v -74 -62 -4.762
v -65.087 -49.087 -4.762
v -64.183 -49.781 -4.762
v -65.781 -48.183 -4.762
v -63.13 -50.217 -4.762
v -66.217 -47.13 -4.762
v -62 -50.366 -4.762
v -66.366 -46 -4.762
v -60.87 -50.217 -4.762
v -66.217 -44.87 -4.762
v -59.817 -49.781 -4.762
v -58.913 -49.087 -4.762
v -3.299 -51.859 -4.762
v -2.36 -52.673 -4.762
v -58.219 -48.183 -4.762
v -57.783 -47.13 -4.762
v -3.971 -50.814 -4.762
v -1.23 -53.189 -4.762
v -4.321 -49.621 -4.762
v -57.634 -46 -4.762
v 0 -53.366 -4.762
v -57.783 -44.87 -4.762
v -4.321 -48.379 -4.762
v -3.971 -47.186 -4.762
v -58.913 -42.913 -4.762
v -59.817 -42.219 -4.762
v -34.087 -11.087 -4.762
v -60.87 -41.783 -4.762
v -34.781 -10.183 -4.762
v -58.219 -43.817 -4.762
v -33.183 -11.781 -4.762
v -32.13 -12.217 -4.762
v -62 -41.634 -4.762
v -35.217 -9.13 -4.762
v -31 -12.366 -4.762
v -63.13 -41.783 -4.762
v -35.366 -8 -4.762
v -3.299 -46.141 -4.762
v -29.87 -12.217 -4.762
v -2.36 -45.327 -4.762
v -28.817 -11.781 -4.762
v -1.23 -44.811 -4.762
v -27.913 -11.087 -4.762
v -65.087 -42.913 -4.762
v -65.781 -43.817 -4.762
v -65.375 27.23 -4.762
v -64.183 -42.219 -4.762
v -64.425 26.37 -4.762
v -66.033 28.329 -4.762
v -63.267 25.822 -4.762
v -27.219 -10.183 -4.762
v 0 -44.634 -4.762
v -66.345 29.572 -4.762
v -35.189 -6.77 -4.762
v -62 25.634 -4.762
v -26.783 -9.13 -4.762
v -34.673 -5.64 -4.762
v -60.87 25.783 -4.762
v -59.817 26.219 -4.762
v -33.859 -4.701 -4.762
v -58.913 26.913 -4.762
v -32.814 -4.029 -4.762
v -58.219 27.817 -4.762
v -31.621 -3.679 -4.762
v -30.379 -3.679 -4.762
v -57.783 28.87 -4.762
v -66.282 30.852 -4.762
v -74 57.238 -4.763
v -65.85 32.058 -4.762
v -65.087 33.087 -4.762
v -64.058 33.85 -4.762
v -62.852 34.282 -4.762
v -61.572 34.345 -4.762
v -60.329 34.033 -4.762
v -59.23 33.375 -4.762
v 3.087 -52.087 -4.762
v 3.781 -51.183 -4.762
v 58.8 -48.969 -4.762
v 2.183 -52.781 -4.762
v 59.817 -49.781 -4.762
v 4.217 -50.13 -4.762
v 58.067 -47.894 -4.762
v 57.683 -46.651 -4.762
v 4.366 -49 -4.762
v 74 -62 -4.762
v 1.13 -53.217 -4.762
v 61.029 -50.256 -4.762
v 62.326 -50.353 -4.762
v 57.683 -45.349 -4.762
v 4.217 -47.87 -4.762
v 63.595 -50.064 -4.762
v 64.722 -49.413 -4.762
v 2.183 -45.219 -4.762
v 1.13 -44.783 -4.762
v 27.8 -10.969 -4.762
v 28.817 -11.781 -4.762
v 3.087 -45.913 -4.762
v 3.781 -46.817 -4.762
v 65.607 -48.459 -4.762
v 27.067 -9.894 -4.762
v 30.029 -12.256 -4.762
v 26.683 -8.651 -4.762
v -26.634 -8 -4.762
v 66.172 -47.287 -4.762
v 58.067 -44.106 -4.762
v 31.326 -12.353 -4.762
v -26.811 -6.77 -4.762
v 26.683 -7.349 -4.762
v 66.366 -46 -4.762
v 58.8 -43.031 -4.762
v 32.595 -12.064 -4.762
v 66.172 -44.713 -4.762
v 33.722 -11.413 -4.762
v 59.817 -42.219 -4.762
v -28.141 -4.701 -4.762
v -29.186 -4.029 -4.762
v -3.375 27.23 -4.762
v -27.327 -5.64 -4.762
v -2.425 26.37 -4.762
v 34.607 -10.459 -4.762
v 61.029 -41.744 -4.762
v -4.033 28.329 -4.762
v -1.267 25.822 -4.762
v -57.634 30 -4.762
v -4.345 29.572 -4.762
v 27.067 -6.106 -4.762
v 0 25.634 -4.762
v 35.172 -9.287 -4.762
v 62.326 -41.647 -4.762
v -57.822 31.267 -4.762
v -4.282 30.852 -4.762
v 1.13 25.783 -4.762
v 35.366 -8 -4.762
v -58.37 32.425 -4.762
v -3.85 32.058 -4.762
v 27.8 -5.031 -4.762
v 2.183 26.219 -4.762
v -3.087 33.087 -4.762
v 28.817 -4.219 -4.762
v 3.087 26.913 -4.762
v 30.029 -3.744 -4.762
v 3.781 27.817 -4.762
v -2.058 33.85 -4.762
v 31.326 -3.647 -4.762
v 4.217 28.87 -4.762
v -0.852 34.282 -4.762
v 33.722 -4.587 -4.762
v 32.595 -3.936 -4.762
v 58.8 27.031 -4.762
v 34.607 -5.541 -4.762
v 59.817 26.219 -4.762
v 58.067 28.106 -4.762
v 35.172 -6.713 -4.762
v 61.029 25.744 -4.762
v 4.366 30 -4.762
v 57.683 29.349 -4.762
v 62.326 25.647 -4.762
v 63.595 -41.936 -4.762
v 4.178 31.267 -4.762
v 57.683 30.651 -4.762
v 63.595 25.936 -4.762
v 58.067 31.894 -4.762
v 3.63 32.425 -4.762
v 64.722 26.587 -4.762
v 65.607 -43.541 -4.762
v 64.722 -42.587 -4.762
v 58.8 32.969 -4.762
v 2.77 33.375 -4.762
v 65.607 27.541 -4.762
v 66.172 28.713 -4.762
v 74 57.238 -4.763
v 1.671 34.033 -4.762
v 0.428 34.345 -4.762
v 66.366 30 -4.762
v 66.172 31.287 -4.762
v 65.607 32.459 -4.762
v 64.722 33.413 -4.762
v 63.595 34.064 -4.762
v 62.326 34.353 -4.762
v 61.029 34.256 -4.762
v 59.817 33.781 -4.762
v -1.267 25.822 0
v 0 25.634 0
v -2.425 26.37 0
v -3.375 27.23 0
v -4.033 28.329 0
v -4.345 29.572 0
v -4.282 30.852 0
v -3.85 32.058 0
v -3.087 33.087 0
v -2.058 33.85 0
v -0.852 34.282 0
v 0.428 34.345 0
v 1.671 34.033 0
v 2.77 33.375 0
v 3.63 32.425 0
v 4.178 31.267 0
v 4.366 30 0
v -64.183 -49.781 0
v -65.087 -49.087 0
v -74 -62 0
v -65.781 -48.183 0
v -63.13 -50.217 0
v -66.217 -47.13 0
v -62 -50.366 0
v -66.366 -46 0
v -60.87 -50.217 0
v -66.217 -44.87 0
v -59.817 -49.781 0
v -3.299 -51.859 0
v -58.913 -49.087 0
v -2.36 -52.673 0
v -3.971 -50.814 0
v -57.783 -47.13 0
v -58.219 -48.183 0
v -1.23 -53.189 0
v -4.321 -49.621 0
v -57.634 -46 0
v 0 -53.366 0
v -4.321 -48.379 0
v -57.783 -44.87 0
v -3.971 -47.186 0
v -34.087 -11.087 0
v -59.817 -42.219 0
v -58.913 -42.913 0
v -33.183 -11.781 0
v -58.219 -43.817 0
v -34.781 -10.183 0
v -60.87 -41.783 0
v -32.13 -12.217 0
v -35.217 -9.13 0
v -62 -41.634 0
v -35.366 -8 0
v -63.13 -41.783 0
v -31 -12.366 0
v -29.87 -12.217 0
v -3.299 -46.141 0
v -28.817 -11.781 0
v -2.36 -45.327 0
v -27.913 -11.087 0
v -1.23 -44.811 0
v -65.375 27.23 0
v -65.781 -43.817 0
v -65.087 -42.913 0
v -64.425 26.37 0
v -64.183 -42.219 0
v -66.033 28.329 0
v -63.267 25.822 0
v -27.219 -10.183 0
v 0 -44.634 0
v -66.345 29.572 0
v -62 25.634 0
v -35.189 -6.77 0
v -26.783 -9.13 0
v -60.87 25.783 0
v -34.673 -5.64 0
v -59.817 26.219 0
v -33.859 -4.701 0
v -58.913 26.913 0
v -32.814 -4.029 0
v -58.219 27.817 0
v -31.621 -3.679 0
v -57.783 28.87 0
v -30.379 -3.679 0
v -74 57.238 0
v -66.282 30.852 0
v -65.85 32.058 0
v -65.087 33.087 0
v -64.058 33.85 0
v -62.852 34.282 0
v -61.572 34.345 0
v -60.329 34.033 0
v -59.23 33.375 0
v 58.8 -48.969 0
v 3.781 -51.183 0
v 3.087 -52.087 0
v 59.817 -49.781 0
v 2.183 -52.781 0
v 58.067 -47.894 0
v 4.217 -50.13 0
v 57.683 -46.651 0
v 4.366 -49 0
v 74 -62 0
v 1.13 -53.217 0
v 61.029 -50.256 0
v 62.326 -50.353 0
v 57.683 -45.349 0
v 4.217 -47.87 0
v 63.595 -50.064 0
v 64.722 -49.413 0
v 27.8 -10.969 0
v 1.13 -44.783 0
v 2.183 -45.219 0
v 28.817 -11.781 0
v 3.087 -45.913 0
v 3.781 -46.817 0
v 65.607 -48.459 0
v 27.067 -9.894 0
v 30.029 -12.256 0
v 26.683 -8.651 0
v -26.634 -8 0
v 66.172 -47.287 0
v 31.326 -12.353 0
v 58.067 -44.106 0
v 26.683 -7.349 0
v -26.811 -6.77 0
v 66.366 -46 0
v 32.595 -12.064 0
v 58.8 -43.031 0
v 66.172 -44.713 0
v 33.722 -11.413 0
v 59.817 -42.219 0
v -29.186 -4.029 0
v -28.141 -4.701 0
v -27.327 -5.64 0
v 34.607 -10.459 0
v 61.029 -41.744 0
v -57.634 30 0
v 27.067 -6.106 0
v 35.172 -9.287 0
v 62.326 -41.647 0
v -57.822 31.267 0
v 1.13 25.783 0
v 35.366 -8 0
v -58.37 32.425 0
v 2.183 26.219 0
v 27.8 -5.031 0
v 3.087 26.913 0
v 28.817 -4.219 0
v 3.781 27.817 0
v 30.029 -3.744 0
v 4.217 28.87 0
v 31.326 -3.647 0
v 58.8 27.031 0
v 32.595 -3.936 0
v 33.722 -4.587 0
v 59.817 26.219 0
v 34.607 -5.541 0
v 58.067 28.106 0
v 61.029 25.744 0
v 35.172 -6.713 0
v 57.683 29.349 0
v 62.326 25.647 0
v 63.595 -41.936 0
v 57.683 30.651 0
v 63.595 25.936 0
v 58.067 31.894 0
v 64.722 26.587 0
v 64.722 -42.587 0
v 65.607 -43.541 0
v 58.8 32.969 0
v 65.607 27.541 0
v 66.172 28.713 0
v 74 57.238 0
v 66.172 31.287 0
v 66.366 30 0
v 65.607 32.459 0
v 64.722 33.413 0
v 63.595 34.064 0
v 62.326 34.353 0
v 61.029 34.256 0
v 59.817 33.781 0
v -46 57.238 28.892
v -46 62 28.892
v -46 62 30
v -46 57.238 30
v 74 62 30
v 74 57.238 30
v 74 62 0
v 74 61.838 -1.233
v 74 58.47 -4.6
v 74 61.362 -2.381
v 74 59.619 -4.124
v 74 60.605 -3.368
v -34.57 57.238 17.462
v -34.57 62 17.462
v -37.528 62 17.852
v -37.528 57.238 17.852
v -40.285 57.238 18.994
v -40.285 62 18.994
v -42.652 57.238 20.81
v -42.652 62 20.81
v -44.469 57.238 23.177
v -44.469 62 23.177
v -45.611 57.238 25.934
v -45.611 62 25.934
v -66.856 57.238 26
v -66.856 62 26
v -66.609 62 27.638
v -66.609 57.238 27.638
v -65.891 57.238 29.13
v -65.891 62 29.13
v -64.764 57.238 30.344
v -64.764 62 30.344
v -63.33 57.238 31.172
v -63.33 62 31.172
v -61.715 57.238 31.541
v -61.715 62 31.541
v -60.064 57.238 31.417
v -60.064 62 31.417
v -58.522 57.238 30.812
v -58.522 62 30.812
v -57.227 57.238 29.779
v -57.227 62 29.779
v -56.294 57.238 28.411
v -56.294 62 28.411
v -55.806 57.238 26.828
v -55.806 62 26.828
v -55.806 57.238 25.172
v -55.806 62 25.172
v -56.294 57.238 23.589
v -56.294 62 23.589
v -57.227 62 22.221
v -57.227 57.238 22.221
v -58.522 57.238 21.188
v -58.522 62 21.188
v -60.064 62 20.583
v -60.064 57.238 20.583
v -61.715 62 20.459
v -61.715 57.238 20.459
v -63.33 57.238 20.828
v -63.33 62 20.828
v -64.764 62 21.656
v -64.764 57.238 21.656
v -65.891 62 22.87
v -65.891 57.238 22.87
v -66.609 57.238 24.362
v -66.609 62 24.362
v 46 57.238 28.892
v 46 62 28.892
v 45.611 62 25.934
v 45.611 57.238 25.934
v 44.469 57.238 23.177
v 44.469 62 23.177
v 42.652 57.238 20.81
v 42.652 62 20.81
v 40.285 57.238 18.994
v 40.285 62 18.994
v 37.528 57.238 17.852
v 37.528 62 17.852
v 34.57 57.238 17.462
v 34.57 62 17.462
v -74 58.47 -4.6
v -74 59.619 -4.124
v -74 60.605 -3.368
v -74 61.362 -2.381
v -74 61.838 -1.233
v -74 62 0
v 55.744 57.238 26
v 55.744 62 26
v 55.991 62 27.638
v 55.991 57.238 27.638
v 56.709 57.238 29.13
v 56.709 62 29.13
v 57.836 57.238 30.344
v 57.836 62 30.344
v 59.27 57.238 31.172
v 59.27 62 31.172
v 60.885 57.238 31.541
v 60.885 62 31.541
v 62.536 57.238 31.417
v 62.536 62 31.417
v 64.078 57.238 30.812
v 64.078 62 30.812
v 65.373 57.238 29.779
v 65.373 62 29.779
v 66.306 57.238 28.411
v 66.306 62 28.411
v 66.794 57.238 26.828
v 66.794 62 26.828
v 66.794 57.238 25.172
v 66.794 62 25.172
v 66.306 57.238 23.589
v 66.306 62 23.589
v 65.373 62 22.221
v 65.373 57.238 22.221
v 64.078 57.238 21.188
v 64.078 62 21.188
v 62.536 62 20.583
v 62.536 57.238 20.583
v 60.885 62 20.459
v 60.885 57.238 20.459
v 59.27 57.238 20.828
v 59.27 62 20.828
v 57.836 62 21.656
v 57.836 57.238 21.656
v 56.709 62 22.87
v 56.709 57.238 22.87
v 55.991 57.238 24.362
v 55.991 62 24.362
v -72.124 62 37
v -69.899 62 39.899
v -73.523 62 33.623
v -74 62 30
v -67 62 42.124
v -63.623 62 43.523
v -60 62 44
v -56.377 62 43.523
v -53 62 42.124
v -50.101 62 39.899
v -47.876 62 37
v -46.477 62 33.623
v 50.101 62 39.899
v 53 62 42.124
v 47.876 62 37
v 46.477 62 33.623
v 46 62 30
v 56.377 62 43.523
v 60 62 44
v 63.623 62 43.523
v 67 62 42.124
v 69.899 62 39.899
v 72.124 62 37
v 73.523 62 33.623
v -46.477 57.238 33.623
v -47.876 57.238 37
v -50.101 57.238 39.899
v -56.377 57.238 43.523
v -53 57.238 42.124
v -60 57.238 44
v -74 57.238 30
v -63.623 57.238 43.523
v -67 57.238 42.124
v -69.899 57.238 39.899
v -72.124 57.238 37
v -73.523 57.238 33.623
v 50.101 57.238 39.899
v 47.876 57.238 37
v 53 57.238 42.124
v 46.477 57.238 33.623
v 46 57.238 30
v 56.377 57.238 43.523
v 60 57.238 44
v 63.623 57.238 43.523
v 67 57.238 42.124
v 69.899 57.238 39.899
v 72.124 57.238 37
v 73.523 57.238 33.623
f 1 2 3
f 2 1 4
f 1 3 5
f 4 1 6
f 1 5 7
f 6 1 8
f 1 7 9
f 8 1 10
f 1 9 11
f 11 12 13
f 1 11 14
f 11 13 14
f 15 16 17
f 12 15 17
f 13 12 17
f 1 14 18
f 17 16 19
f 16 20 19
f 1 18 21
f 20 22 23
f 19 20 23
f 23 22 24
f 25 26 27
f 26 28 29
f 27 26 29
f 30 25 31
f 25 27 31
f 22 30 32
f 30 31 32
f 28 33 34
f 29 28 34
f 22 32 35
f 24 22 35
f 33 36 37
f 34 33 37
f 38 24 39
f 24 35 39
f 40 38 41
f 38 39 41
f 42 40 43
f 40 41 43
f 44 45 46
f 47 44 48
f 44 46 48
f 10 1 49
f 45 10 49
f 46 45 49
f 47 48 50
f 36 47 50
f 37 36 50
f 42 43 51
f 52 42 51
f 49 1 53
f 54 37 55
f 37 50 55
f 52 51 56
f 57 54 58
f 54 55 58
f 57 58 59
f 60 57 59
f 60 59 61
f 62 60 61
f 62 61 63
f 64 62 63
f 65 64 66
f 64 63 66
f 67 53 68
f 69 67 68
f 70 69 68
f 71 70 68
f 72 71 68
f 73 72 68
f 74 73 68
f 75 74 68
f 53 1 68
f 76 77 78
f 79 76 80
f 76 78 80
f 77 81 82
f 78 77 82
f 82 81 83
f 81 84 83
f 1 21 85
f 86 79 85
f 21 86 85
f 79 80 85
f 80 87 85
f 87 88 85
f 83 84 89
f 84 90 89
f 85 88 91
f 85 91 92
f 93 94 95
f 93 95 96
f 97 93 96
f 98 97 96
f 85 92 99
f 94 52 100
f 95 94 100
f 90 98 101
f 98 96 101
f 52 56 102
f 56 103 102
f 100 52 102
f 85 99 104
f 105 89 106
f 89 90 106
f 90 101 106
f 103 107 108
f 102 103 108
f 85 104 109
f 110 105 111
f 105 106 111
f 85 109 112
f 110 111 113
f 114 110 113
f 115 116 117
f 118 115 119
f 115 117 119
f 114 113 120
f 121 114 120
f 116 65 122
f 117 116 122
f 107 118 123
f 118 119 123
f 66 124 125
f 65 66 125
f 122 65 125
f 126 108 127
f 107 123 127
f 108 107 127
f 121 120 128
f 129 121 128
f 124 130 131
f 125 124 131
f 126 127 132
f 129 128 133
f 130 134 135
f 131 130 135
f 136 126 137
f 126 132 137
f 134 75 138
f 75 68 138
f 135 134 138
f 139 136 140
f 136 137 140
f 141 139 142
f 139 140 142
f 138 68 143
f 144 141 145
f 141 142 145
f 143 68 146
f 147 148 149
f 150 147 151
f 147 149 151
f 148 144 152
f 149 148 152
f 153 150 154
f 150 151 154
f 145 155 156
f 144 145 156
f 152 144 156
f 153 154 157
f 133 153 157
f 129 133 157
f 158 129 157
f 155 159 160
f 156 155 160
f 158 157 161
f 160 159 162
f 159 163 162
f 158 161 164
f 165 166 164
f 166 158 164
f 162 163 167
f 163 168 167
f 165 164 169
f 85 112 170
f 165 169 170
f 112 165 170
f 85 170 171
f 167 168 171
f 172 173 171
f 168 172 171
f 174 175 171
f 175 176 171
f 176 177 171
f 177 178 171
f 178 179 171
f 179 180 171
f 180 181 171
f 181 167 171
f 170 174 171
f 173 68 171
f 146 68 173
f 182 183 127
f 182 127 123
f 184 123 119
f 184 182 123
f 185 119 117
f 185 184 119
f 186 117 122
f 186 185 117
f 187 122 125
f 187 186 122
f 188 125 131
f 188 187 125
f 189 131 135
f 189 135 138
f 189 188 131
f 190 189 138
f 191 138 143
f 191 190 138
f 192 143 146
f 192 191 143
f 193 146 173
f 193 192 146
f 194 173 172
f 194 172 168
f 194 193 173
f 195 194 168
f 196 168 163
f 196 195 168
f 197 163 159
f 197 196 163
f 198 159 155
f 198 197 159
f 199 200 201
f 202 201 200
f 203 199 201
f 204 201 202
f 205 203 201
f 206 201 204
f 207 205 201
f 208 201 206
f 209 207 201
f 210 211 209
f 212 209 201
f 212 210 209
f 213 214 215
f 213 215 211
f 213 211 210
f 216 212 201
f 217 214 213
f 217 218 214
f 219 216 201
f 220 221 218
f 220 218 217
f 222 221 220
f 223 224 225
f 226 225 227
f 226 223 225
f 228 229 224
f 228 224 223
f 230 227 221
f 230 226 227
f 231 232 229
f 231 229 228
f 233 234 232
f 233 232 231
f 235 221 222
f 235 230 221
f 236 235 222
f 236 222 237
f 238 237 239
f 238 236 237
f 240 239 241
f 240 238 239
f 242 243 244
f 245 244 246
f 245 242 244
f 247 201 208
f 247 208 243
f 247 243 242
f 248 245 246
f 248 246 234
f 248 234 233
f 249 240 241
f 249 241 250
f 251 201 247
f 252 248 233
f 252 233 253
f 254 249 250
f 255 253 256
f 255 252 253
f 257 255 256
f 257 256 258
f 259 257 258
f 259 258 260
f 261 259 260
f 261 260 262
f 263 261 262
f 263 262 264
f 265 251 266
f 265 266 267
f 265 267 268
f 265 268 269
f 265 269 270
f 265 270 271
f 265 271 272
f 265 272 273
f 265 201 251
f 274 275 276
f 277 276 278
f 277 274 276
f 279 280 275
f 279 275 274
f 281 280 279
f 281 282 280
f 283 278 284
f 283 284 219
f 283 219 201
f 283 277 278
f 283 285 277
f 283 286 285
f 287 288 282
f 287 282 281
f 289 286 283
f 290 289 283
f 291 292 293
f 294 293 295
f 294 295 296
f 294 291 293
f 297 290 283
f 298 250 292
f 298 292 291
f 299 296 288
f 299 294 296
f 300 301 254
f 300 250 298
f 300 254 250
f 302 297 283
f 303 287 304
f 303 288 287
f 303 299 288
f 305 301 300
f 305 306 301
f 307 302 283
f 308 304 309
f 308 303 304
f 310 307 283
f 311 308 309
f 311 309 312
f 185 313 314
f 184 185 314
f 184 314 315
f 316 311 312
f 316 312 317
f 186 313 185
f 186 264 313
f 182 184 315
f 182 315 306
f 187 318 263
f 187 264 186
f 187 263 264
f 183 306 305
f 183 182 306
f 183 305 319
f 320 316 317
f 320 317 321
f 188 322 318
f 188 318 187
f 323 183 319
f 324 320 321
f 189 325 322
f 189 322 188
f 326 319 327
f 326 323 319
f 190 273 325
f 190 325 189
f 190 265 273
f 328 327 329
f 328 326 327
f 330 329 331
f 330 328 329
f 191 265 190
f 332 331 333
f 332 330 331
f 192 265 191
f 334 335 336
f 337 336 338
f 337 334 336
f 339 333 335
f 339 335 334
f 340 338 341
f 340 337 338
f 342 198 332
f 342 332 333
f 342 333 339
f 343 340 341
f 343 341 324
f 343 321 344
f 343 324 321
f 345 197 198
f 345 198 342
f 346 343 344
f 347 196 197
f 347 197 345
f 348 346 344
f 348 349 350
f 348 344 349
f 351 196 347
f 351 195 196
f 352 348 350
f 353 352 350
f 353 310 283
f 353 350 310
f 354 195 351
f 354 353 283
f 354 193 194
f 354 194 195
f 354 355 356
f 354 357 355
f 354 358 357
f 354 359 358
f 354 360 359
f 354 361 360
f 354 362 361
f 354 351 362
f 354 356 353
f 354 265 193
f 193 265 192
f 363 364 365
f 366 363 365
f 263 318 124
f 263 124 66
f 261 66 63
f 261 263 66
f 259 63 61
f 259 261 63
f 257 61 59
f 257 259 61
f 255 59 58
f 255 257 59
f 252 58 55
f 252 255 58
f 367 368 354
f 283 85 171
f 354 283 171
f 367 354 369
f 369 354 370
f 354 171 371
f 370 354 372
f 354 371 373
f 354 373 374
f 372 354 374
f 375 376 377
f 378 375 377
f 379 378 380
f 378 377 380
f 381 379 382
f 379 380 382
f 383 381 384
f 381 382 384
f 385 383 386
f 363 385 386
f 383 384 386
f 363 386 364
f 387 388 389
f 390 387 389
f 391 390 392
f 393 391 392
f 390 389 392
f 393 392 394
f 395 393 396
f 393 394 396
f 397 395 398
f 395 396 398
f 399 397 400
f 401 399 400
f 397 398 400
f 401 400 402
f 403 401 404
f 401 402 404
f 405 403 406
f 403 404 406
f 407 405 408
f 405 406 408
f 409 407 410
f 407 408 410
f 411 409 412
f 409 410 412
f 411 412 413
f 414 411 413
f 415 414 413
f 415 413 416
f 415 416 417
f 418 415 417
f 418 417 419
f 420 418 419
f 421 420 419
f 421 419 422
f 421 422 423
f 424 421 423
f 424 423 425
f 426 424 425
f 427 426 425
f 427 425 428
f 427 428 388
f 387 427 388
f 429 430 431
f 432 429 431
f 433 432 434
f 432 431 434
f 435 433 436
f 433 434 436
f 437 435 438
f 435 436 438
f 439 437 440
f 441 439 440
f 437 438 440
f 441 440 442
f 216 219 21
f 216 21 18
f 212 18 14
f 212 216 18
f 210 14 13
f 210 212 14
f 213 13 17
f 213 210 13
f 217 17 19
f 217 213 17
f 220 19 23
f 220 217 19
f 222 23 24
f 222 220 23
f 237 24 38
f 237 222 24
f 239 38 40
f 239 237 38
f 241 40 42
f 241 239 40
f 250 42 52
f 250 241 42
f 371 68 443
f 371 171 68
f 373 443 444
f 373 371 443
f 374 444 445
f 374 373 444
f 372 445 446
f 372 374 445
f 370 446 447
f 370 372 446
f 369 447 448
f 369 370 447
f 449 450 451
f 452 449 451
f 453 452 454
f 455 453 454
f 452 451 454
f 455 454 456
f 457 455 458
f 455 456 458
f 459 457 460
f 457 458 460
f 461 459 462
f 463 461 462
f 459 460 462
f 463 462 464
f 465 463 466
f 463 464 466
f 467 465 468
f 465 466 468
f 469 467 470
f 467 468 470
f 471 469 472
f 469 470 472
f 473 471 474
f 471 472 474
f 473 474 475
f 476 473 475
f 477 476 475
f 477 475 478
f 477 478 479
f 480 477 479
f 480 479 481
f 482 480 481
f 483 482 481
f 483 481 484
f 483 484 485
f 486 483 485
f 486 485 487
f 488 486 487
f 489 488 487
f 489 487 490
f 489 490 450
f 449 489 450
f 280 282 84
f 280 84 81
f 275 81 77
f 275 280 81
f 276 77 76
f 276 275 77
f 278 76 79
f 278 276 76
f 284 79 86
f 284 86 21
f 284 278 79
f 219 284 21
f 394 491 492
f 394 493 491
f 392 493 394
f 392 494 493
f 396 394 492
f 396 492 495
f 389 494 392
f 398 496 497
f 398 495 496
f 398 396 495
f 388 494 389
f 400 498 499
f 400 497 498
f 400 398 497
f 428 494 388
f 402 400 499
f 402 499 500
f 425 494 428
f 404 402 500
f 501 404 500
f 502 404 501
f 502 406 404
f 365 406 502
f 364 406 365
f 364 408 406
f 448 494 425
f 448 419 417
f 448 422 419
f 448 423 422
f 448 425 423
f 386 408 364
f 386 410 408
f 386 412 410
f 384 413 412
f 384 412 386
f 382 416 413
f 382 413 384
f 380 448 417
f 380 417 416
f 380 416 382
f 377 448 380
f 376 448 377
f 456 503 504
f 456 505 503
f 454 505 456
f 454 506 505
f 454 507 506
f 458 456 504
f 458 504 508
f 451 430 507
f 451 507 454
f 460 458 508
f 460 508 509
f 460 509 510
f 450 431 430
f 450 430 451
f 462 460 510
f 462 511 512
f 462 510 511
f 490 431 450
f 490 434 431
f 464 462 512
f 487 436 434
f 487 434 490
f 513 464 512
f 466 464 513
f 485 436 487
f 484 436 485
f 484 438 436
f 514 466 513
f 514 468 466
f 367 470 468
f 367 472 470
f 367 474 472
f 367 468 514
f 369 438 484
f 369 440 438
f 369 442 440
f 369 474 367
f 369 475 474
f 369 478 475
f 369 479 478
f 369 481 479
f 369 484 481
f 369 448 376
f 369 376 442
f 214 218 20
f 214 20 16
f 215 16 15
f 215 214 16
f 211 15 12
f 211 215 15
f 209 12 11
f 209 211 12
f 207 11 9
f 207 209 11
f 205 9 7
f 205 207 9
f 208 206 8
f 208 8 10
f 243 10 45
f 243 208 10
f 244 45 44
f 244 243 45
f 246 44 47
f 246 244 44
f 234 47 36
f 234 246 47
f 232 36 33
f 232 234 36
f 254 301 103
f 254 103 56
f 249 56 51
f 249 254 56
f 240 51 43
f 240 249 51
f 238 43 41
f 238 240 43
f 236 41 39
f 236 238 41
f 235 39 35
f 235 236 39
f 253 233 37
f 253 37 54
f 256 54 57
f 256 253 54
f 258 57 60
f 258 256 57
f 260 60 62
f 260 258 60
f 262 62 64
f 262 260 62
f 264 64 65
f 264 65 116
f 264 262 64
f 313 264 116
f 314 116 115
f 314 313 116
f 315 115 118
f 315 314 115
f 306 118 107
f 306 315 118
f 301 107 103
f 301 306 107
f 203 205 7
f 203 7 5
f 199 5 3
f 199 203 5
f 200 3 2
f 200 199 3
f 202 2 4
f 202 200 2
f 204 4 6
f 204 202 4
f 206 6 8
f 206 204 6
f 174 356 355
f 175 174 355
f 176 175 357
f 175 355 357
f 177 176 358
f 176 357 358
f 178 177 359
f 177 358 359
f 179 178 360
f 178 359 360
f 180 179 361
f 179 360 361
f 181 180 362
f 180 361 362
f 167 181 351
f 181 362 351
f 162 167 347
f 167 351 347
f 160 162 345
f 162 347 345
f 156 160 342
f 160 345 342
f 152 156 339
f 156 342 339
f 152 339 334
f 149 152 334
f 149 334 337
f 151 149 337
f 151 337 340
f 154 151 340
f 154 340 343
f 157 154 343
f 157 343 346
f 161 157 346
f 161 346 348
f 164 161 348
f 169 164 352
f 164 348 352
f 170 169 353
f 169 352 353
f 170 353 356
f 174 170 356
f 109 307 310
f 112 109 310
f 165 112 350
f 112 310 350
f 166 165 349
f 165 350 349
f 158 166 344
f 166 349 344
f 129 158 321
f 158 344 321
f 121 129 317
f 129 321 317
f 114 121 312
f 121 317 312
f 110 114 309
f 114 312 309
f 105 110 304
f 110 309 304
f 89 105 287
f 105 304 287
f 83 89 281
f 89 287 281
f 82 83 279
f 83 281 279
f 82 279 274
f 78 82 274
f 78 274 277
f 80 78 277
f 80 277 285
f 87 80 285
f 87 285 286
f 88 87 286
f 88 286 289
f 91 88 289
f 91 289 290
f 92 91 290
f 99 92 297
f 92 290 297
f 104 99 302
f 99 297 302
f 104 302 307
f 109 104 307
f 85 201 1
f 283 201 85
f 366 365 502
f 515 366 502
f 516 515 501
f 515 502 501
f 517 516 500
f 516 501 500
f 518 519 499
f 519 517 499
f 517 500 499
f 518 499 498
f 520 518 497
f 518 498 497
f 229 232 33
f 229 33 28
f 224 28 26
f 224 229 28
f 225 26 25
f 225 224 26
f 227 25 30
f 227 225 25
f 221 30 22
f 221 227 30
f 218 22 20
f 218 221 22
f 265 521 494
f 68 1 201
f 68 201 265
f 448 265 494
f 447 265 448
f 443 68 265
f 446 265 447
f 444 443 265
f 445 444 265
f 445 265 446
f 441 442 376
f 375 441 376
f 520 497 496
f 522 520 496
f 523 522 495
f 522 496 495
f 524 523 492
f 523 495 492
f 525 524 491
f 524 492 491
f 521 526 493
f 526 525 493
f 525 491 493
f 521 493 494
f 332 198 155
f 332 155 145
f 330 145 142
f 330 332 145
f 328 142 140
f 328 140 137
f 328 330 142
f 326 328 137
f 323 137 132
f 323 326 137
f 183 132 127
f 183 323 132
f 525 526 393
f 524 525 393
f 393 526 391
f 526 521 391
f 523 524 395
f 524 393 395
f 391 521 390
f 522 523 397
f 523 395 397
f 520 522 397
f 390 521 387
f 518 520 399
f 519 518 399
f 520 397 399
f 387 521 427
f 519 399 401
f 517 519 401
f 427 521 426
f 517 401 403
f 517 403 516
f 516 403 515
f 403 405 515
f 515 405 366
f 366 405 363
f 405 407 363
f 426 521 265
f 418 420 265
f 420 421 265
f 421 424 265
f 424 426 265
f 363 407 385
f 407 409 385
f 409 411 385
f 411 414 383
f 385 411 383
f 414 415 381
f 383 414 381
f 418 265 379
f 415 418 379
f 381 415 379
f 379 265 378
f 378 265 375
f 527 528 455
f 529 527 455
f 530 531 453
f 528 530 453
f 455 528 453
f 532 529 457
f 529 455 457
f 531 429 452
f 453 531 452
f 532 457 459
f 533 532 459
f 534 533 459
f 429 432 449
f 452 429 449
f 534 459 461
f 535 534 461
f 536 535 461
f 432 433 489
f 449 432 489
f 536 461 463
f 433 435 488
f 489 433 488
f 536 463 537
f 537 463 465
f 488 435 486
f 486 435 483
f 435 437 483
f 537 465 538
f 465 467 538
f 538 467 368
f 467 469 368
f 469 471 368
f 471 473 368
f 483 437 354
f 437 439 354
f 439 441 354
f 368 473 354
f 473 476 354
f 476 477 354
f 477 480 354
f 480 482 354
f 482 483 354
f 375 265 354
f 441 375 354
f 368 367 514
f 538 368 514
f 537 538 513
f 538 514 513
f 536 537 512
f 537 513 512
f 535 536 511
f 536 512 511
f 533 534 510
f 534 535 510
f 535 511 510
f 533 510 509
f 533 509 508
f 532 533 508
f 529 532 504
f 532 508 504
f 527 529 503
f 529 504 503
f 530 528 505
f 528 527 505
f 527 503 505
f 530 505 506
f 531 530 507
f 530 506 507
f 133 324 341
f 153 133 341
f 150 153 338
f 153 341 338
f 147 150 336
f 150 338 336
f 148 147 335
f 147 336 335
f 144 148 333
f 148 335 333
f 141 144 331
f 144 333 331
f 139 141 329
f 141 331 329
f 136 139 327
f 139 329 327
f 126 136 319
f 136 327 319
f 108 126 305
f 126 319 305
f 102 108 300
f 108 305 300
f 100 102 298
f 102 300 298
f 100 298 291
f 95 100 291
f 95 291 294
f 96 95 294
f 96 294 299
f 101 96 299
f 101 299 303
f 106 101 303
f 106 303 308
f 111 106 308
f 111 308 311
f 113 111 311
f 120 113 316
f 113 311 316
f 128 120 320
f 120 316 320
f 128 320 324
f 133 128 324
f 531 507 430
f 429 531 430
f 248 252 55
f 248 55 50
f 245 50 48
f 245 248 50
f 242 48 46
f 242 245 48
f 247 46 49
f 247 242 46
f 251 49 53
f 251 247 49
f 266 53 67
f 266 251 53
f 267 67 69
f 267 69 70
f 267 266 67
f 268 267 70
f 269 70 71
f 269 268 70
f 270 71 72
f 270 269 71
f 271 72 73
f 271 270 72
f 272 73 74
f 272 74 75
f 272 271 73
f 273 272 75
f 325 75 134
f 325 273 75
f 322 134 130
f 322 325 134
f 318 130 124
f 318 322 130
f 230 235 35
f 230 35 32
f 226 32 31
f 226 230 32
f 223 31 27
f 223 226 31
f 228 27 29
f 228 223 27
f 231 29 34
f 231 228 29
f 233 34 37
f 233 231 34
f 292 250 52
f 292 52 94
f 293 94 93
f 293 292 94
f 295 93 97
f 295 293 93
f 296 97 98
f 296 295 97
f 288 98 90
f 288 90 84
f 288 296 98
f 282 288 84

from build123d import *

# Parameters (mm, degrees)
F0_R     = 4.365625
F0_W     = 148
F0_H     = 4.7625
F1_DEPTH = 4.7625
F2_DEPTH = 44
F3_R     = 4.7625
F4_R     = 5.55625
F5_DEPTH = 6.35


# Not quite as in the source:
# - a feature names something its author has since deleted; it is built from what else it names


with BuildPart() as f1:
    # F0 (on Top) → F1 (new body)
    with BuildSketch(Plane.XY):
        with BuildLine():
            Line((-31, -12.365625), (-31, -62))
            Line((-31, -62), (0, -62))
            Line((0, -62), (74, -62))
            Line((74, -62), (74, 57.2375))
            Line((74, 57.2375), (-74, 57.2375))
            Line((-74, 57.2375), (-74, -8))
            Line((-74, -8), (-62, -8))
            Line((-62, -8), (-35.365625, -8))
            ThreePointArc((-35.365625, -8), (-31, -3.634375), (-26.634375, -8))
            ThreePointArc((-26.634375, -8), (-27.9130369584, -11.0869630416), (-31, -12.365625))
        make_face()
        with BuildLine():
            ThreePointArc((4.365625, -49), (3.0869630416, -52.0869630416), (0, -53.365625))
            ThreePointArc((0, -53.365625), (-4.365625, -49), (0, -44.634375))
            ThreePointArc((0, -44.634375), (3.0869630416, -45.9130369584), (4.365625, -49))
        make_face(mode=Mode.SUBTRACT)
        with Locations((62, -46)):
            Circle(F0_R, mode=Mode.SUBTRACT)
        with Locations((31, -8)):
            Circle(F0_R, mode=Mode.SUBTRACT)
        with BuildLine():
            ThreePointArc((-57.634375, 30), (-58.9130369584, 26.9130369584), (-62, 25.634375))
            ThreePointArc((-62, 25.634375), (-65.0869630416, 33.0869630416), (-57.634375, 30))
        make_face(mode=Mode.SUBTRACT)
        with BuildLine():
            ThreePointArc((4.365625, 30), (3.0869630416, 26.9130369584), (0, 25.634375))
            ThreePointArc((0, 25.634375), (-3.0869630416, 33.0869630416), (4.365625, 30))
        make_face(mode=Mode.SUBTRACT)
        with Locations((62, 30)):
            Circle(F0_R, mode=Mode.SUBTRACT)
        with Locations((0, 59.61875)):
            Rectangle(F0_W, F0_H)
        with BuildLine():
            Line((-62, -50.365625), (-62, -62))
            Line((-62, -62), (-31, -62))
            Line((-31, -62), (-31, -12.365625))
            ThreePointArc((-31, -12.365625), (-34.0869630416, -11.0869630416), (-35.365625, -8))
            Line((-35.365625, -8), (-62, -8))
            Line((-62, -8), (-62, -41.634375))
            ThreePointArc((-62, -41.634375), (-58.9130369584, -42.9130369584), (-57.634375, -46))
            ThreePointArc((-57.634375, -46), (-58.9130369584, -49.0869630416), (-62, -50.365625))
        make_face()
        with BuildLine():
            Line((-74, -8), (-74, -46))
            Line((-74, -46), (-66.365625, -46))
            ThreePointArc((-66.365625, -46), (-65.0869630416, -42.9130369584), (-62, -41.634375))
            Line((-62, -41.634375), (-62, -8))
            Line((-62, -8), (-74, -8))
        make_face()
        with BuildLine():
            Line((-74, -46), (-74, -62))
            Line((-74, -62), (-62, -62))
            Line((-62, -62), (-62, -50.365625))
            ThreePointArc((-62, -50.365625), (-65.0869630416, -49.0869630416), (-66.365625, -46))
            Line((-66.365625, -46), (-74, -46))
        make_face()
    extrude(amount=-F1_DEPTH)

    # F0 (on Top) → F2 (join)
    with BuildSketch(Plane.XY):
        with Locations((0, 59.61875)):
            Rectangle(F0_W, F0_H)
    extrude(amount=F2_DEPTH)

    # F3
    f3_edges = [f1.edges().sort_by_distance(p)[0] for p in [
        (0, 62, -4.7625),
    ]]
    fillet(f3_edges, radius=F3_R)

    # F4 (on face) → F5 (cut)
    with BuildSketch(Plane(origin=(0, 62, 0), x_dir=(-1, 0, 0), z_dir=(0, 1, 0))):
        with BuildLine():
            ThreePointArc((-60, 44), (-50.1005050634, 39.8994949366), (-46, 30))
            Line((-46, 30), (-46, 28.8925))
            ThreePointArc((-46, 28.8925), (-42.652230509, 20.810269491), (-34.57, 17.4625))
            Line((-34.57, 17.4625), (0, 17.4625))
            Line((0, 17.4625), (34.57, 17.4625))
            ThreePointArc((34.57, 17.4625), (42.652230509, 20.810269491), (46, 28.8925))
            Line((46, 28.8925), (46, 30))
            ThreePointArc((46, 30), (50.1005050634, 39.8994949366), (60, 44))
            Line((60, 44), (59.7125, 44))
            Line((59.7125, 44), (-60, 44))
        make_face()
        with BuildLine():
            Line((74, 44), (60, 44))
            ThreePointArc((60, 44), (69.8994949366, 39.8994949366), (74, 30))
            Line((74, 30), (74, 44))
        make_face()
        with Locations((-61.3, 26)):
            Circle(F4_R)
        with Locations((61.3, 26)):
            Circle(F4_R)
        with BuildLine():
            ThreePointArc((-74, 30), (-69.8994949366, 39.8994949366), (-60, 44))
            Line((-60, 44), (-74, 44))
            Line((-74, 44), (-74, 30))
        make_face()
    extrude(amount=-F5_DEPTH, mode=Mode.SUBTRACT)


solid = f1.part
